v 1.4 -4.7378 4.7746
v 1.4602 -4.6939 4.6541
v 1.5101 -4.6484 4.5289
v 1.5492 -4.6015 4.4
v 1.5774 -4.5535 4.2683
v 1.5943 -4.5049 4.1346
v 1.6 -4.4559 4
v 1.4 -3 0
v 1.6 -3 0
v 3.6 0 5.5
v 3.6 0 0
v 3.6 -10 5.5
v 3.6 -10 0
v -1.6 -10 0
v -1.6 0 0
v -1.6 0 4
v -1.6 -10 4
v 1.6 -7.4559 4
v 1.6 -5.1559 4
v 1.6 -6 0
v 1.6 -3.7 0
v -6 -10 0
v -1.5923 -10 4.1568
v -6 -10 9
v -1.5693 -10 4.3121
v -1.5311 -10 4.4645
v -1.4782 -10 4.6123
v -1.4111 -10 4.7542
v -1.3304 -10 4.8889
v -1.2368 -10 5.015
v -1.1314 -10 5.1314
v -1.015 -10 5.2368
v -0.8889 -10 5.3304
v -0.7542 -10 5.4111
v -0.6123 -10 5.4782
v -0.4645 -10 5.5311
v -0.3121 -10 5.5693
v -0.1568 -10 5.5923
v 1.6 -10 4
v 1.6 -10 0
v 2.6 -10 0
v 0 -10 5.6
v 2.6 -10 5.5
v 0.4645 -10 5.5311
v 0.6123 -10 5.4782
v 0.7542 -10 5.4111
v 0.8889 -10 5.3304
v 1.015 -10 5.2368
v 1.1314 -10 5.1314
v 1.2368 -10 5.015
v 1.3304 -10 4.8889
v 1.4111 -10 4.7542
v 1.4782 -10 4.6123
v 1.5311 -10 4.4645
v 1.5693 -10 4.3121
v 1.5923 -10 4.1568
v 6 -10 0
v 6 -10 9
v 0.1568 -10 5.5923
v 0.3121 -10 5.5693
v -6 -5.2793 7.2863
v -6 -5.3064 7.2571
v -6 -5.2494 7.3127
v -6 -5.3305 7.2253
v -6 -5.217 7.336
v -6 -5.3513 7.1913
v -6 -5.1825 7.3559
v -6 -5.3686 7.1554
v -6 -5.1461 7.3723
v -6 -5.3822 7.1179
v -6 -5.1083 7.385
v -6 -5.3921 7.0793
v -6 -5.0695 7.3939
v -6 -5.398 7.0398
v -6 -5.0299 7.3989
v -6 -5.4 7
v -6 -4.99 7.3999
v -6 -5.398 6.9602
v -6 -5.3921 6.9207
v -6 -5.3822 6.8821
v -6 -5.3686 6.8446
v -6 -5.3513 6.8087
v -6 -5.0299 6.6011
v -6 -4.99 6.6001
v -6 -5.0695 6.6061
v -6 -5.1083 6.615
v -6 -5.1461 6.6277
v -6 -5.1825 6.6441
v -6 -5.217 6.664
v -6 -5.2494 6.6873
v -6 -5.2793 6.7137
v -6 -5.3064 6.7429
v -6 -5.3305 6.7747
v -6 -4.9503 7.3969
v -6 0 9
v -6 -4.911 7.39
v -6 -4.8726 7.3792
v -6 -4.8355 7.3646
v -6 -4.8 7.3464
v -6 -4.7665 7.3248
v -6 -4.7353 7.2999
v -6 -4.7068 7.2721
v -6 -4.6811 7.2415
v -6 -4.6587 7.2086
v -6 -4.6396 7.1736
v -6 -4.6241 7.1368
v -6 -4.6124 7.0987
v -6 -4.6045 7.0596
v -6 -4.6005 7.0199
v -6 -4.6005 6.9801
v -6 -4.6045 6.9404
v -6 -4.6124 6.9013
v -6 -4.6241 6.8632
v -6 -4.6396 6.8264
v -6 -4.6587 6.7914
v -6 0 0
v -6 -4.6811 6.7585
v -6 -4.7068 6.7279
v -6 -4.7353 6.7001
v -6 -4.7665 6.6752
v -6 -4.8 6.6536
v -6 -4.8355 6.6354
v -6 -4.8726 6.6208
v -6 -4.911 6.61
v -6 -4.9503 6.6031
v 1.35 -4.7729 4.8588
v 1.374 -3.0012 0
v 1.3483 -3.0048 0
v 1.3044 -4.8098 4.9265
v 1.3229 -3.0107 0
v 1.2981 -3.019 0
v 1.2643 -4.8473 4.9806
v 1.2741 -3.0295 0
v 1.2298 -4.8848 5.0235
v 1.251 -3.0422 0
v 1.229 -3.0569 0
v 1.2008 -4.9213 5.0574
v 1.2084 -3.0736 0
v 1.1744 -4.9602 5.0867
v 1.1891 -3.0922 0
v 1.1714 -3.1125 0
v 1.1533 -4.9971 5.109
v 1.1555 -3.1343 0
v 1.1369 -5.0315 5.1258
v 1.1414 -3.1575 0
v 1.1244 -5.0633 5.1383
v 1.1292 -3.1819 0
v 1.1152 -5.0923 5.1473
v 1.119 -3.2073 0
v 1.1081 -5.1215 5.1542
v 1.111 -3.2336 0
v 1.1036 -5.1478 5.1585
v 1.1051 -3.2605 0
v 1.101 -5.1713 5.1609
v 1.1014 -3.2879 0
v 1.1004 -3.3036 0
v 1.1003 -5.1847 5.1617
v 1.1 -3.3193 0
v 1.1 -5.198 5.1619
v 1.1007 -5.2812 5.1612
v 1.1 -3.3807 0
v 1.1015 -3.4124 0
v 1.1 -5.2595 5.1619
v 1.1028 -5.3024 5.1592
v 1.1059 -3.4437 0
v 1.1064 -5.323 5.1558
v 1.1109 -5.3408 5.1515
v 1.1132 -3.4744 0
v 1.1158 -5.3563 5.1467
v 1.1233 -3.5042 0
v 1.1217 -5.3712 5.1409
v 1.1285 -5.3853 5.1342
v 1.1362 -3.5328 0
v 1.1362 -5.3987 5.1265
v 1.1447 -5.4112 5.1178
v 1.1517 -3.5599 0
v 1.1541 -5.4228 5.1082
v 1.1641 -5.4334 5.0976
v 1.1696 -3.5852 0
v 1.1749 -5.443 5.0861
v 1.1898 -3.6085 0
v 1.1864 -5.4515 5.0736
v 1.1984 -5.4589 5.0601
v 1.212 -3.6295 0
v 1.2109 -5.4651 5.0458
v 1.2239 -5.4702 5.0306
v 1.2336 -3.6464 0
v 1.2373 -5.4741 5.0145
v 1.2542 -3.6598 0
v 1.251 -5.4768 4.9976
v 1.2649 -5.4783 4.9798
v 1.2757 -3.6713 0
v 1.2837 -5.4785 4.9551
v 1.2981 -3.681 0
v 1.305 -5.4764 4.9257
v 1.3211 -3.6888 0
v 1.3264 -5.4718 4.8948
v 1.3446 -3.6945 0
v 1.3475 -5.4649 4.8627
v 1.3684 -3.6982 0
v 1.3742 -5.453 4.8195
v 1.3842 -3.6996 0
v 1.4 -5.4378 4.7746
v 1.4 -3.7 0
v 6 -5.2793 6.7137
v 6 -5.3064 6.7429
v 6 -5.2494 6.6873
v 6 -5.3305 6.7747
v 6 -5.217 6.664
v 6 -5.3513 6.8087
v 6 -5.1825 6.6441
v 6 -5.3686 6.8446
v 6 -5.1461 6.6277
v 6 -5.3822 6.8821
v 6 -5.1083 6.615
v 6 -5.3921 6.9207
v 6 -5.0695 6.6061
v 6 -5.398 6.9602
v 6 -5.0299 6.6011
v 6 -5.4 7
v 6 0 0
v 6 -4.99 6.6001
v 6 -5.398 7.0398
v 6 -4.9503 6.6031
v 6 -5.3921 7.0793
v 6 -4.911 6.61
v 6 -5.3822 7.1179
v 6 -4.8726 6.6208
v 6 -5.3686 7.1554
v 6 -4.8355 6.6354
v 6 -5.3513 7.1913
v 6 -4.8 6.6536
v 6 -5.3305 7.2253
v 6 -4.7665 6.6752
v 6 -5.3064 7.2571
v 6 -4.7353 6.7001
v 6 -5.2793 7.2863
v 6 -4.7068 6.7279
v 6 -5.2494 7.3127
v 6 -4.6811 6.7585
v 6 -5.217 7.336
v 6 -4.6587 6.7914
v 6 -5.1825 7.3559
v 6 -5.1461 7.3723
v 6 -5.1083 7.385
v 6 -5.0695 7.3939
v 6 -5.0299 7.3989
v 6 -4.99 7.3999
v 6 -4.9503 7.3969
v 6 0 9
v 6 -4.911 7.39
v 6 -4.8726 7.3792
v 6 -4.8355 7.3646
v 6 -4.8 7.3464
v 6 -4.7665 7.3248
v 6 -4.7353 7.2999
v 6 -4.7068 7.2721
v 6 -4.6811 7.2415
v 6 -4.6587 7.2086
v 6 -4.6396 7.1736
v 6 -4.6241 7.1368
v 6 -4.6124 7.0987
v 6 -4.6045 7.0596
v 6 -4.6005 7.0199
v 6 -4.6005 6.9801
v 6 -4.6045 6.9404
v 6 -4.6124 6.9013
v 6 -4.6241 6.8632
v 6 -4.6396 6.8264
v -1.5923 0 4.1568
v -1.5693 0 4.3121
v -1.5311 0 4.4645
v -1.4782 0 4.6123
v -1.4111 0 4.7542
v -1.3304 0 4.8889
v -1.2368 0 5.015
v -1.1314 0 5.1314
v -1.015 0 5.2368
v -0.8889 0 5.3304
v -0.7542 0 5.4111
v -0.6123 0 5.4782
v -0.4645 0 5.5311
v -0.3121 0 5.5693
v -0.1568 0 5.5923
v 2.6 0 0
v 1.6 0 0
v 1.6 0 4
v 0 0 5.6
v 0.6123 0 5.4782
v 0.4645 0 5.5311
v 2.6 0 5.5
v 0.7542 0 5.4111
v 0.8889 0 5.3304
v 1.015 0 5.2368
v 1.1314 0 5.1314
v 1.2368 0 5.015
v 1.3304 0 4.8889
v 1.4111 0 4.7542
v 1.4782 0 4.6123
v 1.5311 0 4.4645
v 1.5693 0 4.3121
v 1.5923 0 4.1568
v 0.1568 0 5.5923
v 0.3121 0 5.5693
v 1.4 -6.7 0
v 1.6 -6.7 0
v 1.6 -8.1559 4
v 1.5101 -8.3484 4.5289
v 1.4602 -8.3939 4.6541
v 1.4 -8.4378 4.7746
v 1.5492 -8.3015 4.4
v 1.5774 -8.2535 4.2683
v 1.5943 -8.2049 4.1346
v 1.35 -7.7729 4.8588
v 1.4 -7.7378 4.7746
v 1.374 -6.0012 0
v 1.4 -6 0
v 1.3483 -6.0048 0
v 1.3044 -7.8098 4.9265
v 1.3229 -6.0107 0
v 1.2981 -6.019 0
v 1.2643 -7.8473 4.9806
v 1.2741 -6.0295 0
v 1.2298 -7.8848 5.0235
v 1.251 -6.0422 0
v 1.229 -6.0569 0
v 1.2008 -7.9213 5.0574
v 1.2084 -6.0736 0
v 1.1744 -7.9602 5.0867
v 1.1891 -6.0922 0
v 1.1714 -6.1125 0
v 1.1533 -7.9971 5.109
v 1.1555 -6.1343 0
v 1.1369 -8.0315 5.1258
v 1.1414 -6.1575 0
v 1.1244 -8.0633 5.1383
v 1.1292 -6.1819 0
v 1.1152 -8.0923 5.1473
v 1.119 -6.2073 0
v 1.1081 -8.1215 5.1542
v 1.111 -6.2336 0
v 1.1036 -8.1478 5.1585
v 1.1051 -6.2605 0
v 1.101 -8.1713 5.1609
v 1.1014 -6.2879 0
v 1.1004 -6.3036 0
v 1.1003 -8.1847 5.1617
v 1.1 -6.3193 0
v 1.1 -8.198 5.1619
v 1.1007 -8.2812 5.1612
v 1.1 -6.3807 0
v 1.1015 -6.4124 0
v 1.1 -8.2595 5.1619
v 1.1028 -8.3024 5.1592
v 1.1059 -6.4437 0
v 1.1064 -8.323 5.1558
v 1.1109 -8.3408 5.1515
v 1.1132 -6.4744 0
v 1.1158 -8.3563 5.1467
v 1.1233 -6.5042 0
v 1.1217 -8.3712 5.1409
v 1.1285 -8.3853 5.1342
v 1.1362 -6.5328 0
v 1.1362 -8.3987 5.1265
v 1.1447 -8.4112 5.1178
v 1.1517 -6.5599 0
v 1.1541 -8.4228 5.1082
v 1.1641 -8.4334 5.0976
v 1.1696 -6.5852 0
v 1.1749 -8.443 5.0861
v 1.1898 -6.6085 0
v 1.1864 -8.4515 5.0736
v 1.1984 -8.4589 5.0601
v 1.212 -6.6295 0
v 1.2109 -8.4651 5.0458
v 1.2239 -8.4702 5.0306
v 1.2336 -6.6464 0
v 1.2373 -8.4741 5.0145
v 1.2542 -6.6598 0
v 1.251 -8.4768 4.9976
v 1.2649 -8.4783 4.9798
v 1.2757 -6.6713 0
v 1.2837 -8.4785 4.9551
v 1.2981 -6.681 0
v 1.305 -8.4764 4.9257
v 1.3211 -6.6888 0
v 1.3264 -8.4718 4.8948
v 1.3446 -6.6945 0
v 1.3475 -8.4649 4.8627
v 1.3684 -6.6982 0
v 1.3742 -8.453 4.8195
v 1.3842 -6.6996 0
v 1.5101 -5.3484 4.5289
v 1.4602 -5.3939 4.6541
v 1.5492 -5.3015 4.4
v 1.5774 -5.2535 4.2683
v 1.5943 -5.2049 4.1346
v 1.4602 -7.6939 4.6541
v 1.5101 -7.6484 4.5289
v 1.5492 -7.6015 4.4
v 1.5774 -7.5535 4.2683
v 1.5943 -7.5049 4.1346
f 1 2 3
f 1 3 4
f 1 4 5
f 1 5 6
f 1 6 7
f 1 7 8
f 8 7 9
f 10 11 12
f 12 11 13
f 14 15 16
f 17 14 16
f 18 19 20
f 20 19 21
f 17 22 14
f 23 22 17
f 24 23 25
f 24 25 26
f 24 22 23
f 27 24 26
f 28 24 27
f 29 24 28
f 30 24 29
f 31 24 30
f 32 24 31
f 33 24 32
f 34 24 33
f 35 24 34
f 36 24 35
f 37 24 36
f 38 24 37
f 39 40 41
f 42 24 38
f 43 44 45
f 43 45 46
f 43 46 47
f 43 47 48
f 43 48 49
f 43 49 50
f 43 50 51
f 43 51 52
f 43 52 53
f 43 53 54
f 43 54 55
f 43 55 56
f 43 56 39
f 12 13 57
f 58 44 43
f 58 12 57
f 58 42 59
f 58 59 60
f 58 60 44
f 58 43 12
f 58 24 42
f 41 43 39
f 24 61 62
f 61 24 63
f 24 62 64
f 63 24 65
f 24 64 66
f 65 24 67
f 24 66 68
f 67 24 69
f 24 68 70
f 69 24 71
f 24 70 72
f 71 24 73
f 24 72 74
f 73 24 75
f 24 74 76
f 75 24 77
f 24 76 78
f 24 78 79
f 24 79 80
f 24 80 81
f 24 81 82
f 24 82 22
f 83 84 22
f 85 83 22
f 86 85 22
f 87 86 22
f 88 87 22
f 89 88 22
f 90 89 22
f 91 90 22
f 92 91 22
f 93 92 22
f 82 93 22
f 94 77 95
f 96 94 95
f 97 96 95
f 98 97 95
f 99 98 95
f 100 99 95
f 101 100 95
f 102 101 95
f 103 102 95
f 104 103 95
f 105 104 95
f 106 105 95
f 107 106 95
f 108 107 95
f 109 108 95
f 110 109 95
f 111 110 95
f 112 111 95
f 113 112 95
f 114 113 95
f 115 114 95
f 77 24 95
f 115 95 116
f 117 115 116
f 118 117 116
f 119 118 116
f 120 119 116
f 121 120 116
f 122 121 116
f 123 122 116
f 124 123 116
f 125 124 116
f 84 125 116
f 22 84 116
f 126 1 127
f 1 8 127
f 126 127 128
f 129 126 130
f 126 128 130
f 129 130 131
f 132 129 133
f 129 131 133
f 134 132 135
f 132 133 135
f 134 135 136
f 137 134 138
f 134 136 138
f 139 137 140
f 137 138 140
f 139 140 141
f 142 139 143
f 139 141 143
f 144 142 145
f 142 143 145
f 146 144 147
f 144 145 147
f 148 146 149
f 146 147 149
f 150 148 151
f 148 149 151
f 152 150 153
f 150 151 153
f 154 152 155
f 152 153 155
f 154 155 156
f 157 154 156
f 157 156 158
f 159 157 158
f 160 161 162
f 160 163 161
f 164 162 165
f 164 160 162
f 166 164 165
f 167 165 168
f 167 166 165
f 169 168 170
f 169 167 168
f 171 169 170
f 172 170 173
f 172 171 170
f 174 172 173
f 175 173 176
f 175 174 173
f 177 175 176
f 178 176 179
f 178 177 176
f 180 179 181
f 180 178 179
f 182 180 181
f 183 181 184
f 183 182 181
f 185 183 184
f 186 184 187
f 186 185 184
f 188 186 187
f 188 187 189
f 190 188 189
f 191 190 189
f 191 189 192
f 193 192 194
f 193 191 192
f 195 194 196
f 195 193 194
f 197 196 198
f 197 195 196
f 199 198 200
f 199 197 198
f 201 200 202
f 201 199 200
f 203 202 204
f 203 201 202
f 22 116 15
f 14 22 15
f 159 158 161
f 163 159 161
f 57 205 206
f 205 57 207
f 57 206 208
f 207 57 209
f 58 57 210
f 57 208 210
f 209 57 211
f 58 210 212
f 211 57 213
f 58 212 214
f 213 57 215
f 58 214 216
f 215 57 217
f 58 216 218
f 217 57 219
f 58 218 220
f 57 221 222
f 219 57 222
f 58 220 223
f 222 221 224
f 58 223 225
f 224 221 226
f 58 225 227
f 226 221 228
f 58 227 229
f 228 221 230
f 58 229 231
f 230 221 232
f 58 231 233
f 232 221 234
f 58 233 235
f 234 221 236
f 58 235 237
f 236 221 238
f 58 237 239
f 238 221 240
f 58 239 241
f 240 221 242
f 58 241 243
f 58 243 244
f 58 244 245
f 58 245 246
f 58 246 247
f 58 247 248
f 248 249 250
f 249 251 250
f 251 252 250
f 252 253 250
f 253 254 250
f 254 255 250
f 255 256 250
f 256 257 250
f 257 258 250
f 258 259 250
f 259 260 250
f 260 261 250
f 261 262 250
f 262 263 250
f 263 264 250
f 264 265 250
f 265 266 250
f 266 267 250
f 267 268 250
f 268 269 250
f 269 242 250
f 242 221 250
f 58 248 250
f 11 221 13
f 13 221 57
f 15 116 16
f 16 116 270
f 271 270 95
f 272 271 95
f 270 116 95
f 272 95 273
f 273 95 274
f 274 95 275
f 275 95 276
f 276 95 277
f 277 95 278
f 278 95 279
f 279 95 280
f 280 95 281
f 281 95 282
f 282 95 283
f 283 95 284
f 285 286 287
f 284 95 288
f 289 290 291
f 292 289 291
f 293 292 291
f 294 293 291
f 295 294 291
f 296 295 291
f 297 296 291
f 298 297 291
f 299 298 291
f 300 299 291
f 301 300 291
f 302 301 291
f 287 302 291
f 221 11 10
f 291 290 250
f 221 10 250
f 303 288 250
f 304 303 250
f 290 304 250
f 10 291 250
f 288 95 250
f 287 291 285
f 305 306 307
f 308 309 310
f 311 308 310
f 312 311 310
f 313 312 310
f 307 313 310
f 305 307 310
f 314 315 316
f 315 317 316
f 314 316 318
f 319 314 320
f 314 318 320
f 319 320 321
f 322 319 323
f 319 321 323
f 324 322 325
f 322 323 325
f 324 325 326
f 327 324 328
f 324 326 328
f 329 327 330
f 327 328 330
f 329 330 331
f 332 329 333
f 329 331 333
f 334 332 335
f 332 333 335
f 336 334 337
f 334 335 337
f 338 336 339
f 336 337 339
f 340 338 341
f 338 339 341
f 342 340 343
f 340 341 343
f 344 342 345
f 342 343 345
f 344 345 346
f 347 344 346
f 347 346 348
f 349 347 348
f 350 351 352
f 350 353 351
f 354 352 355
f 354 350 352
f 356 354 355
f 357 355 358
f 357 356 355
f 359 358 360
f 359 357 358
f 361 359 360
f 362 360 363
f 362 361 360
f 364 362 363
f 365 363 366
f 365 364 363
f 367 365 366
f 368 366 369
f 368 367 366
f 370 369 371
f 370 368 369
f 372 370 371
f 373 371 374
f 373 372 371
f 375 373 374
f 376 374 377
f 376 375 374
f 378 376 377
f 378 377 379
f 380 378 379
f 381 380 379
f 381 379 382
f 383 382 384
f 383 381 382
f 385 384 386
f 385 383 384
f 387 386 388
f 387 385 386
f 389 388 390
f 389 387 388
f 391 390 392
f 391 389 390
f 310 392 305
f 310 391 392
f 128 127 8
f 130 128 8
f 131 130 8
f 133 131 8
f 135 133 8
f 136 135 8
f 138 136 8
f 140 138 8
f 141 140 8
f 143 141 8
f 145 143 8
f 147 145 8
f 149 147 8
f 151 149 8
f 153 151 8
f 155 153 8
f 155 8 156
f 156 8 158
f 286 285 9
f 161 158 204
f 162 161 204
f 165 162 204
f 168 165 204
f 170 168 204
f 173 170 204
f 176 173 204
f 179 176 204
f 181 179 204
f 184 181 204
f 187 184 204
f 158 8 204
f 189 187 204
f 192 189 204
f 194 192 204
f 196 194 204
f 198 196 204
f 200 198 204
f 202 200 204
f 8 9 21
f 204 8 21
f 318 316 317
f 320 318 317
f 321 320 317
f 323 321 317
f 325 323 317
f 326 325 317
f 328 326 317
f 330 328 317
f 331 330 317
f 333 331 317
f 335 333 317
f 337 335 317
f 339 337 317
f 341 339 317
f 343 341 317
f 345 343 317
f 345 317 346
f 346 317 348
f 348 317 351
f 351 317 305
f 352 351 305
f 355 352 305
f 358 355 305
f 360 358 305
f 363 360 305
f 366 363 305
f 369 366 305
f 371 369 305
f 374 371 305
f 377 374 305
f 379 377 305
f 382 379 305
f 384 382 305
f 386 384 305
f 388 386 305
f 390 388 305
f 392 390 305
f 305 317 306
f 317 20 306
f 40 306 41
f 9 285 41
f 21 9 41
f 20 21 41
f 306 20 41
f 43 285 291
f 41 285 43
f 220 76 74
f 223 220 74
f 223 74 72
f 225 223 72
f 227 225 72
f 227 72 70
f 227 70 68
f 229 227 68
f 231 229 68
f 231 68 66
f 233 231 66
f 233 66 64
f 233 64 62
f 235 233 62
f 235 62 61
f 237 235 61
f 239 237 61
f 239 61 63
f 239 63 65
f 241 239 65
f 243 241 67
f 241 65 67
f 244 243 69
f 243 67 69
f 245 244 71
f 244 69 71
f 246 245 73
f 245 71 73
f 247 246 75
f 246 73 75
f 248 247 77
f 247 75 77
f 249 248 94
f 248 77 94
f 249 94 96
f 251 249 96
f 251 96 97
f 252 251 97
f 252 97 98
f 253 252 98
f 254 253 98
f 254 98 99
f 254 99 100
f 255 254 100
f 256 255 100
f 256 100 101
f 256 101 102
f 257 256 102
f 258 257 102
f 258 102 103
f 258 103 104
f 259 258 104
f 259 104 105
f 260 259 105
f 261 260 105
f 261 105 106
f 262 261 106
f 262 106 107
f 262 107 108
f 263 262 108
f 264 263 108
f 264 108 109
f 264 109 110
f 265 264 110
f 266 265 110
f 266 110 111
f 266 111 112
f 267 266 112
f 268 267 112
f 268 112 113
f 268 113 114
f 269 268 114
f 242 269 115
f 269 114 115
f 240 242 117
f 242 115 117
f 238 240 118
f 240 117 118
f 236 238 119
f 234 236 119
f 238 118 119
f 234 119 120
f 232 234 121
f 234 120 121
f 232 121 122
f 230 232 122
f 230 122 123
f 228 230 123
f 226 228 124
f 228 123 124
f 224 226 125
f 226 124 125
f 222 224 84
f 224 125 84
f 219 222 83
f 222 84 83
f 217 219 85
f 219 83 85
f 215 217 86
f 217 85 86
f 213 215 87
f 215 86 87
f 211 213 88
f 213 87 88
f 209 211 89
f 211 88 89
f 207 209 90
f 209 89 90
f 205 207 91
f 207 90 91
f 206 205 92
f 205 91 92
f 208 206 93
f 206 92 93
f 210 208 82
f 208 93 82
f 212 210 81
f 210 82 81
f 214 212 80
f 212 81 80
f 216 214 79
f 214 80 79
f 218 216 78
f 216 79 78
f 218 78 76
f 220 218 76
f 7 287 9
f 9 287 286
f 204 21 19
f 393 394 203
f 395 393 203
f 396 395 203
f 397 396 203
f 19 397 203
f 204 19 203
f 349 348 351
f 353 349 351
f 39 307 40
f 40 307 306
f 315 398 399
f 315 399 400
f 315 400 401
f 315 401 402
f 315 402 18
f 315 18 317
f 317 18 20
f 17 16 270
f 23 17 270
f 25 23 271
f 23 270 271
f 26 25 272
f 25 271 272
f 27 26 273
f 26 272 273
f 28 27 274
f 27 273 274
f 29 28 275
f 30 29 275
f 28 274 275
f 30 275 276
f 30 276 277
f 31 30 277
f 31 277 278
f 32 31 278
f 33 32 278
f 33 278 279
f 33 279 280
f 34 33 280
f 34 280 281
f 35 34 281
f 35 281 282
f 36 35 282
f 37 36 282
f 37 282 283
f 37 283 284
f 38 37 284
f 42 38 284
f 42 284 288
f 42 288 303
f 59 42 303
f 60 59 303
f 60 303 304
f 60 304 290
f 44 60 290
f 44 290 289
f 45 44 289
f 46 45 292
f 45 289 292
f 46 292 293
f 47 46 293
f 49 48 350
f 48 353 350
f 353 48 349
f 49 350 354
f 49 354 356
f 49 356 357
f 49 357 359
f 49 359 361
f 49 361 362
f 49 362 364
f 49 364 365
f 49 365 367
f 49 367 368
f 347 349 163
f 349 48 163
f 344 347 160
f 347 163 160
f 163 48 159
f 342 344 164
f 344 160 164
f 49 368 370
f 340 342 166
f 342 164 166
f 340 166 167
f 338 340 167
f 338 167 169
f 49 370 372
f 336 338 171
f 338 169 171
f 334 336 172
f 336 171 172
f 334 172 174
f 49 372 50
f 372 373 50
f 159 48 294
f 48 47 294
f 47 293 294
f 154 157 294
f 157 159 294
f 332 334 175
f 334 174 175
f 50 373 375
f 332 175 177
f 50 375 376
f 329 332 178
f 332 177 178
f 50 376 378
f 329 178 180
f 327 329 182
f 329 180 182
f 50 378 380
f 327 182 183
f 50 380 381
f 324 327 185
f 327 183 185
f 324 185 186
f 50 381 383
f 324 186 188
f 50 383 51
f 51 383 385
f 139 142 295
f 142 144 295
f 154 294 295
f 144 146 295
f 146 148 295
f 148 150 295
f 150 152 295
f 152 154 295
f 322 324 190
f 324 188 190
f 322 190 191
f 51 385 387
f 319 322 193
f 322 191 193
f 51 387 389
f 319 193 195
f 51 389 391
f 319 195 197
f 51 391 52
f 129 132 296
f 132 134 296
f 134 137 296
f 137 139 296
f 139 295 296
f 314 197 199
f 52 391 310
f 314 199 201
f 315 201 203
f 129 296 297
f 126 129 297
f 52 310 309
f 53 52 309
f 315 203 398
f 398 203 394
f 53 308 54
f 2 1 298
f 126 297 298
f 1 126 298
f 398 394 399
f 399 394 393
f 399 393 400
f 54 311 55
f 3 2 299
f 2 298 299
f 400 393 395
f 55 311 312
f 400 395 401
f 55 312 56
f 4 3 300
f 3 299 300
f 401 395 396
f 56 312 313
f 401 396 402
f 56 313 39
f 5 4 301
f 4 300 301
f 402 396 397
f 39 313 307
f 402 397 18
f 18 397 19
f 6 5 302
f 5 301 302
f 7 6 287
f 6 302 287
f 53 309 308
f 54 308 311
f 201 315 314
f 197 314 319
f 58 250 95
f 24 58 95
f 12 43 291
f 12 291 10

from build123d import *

# Parameters (mm, degrees)
F1_DEPTH = 10
F3_DEPTH = 0.5
F4_R     = 0.3
F5_W     = 1
F5_H     = 10
F6_DEPTH = 5.5
F7_R     = 0.4
F8_DEPTH = 12.001


# Not quite as in the source:
# - a feature names something its author has since deleted; it is built from what else it names


with BuildPart() as f1:
    # F0 (on Front) → F1 (new body)
    with BuildSketch(Plane.XZ):
        with BuildLine():
            Line((-6, 9), (-6, 0))
            Line((-6, 0), (-1.6, 0))
            Line((-1.6, 0), (-1.6, 4))
            ThreePointArc((-1.6, 4), (0, 5.6), (1.6, 4))
            Line((1.6, 4), (1.6, 0))
            Line((1.6, 0), (6, 0))
            Line((6, 0), (6, 9))
            Line((6, 9), (-6, 9))
        make_face()
    extrude(amount=F1_DEPTH)

    # F2 (on face) → F3 (join)
    with BuildSketch(Plane(origin=(1.6, 0, 0), x_dir=(0, -1, 0), z_dir=(-1, 0, 0))):
        Polygon((5.1838214056, 6), (3, 0), (3.7, 0), (5.8838214056, 6), align=None)
        Polygon((6, 0), (6.7, 0), (8.8838214056, 6), (8.1838214056, 6), align=None)
    extrude(amount=F3_DEPTH)

    # F4
    f4_edges = [f1.edges().sort_by_distance(p)[0] for p in [
        (1.1, -3.939388, 2.580948),
        (1.1, -4.639388, 2.580948),
        (1.1, -6.939388, 2.580948),
        (1.1, -7.639388, 2.580948),
    ]]
    fillet(f4_edges, radius=F4_R)

    # F5 (on face) → F6 (cut)
    with BuildSketch(Plane(origin=(0, 0, 0), x_dir=(1, 0, 0), z_dir=(0, 0, -1))):
        with Locations((3.1, 5)):
            Rectangle(F5_W, F5_H)
    extrude(amount=-F6_DEPTH, mode=Mode.SUBTRACT)

    # F7 (on face) → F8 (cut, through all)
    with BuildSketch(Plane(origin=(-6, 0, 0), x_dir=(0, -1, 0), z_dir=(-1, 0, 0))):
        with Locations((5, 7)):
            Circle(F7_R)
    extrude(amount=-F8_DEPTH, mode=Mode.SUBTRACT)


solid = f1.part
